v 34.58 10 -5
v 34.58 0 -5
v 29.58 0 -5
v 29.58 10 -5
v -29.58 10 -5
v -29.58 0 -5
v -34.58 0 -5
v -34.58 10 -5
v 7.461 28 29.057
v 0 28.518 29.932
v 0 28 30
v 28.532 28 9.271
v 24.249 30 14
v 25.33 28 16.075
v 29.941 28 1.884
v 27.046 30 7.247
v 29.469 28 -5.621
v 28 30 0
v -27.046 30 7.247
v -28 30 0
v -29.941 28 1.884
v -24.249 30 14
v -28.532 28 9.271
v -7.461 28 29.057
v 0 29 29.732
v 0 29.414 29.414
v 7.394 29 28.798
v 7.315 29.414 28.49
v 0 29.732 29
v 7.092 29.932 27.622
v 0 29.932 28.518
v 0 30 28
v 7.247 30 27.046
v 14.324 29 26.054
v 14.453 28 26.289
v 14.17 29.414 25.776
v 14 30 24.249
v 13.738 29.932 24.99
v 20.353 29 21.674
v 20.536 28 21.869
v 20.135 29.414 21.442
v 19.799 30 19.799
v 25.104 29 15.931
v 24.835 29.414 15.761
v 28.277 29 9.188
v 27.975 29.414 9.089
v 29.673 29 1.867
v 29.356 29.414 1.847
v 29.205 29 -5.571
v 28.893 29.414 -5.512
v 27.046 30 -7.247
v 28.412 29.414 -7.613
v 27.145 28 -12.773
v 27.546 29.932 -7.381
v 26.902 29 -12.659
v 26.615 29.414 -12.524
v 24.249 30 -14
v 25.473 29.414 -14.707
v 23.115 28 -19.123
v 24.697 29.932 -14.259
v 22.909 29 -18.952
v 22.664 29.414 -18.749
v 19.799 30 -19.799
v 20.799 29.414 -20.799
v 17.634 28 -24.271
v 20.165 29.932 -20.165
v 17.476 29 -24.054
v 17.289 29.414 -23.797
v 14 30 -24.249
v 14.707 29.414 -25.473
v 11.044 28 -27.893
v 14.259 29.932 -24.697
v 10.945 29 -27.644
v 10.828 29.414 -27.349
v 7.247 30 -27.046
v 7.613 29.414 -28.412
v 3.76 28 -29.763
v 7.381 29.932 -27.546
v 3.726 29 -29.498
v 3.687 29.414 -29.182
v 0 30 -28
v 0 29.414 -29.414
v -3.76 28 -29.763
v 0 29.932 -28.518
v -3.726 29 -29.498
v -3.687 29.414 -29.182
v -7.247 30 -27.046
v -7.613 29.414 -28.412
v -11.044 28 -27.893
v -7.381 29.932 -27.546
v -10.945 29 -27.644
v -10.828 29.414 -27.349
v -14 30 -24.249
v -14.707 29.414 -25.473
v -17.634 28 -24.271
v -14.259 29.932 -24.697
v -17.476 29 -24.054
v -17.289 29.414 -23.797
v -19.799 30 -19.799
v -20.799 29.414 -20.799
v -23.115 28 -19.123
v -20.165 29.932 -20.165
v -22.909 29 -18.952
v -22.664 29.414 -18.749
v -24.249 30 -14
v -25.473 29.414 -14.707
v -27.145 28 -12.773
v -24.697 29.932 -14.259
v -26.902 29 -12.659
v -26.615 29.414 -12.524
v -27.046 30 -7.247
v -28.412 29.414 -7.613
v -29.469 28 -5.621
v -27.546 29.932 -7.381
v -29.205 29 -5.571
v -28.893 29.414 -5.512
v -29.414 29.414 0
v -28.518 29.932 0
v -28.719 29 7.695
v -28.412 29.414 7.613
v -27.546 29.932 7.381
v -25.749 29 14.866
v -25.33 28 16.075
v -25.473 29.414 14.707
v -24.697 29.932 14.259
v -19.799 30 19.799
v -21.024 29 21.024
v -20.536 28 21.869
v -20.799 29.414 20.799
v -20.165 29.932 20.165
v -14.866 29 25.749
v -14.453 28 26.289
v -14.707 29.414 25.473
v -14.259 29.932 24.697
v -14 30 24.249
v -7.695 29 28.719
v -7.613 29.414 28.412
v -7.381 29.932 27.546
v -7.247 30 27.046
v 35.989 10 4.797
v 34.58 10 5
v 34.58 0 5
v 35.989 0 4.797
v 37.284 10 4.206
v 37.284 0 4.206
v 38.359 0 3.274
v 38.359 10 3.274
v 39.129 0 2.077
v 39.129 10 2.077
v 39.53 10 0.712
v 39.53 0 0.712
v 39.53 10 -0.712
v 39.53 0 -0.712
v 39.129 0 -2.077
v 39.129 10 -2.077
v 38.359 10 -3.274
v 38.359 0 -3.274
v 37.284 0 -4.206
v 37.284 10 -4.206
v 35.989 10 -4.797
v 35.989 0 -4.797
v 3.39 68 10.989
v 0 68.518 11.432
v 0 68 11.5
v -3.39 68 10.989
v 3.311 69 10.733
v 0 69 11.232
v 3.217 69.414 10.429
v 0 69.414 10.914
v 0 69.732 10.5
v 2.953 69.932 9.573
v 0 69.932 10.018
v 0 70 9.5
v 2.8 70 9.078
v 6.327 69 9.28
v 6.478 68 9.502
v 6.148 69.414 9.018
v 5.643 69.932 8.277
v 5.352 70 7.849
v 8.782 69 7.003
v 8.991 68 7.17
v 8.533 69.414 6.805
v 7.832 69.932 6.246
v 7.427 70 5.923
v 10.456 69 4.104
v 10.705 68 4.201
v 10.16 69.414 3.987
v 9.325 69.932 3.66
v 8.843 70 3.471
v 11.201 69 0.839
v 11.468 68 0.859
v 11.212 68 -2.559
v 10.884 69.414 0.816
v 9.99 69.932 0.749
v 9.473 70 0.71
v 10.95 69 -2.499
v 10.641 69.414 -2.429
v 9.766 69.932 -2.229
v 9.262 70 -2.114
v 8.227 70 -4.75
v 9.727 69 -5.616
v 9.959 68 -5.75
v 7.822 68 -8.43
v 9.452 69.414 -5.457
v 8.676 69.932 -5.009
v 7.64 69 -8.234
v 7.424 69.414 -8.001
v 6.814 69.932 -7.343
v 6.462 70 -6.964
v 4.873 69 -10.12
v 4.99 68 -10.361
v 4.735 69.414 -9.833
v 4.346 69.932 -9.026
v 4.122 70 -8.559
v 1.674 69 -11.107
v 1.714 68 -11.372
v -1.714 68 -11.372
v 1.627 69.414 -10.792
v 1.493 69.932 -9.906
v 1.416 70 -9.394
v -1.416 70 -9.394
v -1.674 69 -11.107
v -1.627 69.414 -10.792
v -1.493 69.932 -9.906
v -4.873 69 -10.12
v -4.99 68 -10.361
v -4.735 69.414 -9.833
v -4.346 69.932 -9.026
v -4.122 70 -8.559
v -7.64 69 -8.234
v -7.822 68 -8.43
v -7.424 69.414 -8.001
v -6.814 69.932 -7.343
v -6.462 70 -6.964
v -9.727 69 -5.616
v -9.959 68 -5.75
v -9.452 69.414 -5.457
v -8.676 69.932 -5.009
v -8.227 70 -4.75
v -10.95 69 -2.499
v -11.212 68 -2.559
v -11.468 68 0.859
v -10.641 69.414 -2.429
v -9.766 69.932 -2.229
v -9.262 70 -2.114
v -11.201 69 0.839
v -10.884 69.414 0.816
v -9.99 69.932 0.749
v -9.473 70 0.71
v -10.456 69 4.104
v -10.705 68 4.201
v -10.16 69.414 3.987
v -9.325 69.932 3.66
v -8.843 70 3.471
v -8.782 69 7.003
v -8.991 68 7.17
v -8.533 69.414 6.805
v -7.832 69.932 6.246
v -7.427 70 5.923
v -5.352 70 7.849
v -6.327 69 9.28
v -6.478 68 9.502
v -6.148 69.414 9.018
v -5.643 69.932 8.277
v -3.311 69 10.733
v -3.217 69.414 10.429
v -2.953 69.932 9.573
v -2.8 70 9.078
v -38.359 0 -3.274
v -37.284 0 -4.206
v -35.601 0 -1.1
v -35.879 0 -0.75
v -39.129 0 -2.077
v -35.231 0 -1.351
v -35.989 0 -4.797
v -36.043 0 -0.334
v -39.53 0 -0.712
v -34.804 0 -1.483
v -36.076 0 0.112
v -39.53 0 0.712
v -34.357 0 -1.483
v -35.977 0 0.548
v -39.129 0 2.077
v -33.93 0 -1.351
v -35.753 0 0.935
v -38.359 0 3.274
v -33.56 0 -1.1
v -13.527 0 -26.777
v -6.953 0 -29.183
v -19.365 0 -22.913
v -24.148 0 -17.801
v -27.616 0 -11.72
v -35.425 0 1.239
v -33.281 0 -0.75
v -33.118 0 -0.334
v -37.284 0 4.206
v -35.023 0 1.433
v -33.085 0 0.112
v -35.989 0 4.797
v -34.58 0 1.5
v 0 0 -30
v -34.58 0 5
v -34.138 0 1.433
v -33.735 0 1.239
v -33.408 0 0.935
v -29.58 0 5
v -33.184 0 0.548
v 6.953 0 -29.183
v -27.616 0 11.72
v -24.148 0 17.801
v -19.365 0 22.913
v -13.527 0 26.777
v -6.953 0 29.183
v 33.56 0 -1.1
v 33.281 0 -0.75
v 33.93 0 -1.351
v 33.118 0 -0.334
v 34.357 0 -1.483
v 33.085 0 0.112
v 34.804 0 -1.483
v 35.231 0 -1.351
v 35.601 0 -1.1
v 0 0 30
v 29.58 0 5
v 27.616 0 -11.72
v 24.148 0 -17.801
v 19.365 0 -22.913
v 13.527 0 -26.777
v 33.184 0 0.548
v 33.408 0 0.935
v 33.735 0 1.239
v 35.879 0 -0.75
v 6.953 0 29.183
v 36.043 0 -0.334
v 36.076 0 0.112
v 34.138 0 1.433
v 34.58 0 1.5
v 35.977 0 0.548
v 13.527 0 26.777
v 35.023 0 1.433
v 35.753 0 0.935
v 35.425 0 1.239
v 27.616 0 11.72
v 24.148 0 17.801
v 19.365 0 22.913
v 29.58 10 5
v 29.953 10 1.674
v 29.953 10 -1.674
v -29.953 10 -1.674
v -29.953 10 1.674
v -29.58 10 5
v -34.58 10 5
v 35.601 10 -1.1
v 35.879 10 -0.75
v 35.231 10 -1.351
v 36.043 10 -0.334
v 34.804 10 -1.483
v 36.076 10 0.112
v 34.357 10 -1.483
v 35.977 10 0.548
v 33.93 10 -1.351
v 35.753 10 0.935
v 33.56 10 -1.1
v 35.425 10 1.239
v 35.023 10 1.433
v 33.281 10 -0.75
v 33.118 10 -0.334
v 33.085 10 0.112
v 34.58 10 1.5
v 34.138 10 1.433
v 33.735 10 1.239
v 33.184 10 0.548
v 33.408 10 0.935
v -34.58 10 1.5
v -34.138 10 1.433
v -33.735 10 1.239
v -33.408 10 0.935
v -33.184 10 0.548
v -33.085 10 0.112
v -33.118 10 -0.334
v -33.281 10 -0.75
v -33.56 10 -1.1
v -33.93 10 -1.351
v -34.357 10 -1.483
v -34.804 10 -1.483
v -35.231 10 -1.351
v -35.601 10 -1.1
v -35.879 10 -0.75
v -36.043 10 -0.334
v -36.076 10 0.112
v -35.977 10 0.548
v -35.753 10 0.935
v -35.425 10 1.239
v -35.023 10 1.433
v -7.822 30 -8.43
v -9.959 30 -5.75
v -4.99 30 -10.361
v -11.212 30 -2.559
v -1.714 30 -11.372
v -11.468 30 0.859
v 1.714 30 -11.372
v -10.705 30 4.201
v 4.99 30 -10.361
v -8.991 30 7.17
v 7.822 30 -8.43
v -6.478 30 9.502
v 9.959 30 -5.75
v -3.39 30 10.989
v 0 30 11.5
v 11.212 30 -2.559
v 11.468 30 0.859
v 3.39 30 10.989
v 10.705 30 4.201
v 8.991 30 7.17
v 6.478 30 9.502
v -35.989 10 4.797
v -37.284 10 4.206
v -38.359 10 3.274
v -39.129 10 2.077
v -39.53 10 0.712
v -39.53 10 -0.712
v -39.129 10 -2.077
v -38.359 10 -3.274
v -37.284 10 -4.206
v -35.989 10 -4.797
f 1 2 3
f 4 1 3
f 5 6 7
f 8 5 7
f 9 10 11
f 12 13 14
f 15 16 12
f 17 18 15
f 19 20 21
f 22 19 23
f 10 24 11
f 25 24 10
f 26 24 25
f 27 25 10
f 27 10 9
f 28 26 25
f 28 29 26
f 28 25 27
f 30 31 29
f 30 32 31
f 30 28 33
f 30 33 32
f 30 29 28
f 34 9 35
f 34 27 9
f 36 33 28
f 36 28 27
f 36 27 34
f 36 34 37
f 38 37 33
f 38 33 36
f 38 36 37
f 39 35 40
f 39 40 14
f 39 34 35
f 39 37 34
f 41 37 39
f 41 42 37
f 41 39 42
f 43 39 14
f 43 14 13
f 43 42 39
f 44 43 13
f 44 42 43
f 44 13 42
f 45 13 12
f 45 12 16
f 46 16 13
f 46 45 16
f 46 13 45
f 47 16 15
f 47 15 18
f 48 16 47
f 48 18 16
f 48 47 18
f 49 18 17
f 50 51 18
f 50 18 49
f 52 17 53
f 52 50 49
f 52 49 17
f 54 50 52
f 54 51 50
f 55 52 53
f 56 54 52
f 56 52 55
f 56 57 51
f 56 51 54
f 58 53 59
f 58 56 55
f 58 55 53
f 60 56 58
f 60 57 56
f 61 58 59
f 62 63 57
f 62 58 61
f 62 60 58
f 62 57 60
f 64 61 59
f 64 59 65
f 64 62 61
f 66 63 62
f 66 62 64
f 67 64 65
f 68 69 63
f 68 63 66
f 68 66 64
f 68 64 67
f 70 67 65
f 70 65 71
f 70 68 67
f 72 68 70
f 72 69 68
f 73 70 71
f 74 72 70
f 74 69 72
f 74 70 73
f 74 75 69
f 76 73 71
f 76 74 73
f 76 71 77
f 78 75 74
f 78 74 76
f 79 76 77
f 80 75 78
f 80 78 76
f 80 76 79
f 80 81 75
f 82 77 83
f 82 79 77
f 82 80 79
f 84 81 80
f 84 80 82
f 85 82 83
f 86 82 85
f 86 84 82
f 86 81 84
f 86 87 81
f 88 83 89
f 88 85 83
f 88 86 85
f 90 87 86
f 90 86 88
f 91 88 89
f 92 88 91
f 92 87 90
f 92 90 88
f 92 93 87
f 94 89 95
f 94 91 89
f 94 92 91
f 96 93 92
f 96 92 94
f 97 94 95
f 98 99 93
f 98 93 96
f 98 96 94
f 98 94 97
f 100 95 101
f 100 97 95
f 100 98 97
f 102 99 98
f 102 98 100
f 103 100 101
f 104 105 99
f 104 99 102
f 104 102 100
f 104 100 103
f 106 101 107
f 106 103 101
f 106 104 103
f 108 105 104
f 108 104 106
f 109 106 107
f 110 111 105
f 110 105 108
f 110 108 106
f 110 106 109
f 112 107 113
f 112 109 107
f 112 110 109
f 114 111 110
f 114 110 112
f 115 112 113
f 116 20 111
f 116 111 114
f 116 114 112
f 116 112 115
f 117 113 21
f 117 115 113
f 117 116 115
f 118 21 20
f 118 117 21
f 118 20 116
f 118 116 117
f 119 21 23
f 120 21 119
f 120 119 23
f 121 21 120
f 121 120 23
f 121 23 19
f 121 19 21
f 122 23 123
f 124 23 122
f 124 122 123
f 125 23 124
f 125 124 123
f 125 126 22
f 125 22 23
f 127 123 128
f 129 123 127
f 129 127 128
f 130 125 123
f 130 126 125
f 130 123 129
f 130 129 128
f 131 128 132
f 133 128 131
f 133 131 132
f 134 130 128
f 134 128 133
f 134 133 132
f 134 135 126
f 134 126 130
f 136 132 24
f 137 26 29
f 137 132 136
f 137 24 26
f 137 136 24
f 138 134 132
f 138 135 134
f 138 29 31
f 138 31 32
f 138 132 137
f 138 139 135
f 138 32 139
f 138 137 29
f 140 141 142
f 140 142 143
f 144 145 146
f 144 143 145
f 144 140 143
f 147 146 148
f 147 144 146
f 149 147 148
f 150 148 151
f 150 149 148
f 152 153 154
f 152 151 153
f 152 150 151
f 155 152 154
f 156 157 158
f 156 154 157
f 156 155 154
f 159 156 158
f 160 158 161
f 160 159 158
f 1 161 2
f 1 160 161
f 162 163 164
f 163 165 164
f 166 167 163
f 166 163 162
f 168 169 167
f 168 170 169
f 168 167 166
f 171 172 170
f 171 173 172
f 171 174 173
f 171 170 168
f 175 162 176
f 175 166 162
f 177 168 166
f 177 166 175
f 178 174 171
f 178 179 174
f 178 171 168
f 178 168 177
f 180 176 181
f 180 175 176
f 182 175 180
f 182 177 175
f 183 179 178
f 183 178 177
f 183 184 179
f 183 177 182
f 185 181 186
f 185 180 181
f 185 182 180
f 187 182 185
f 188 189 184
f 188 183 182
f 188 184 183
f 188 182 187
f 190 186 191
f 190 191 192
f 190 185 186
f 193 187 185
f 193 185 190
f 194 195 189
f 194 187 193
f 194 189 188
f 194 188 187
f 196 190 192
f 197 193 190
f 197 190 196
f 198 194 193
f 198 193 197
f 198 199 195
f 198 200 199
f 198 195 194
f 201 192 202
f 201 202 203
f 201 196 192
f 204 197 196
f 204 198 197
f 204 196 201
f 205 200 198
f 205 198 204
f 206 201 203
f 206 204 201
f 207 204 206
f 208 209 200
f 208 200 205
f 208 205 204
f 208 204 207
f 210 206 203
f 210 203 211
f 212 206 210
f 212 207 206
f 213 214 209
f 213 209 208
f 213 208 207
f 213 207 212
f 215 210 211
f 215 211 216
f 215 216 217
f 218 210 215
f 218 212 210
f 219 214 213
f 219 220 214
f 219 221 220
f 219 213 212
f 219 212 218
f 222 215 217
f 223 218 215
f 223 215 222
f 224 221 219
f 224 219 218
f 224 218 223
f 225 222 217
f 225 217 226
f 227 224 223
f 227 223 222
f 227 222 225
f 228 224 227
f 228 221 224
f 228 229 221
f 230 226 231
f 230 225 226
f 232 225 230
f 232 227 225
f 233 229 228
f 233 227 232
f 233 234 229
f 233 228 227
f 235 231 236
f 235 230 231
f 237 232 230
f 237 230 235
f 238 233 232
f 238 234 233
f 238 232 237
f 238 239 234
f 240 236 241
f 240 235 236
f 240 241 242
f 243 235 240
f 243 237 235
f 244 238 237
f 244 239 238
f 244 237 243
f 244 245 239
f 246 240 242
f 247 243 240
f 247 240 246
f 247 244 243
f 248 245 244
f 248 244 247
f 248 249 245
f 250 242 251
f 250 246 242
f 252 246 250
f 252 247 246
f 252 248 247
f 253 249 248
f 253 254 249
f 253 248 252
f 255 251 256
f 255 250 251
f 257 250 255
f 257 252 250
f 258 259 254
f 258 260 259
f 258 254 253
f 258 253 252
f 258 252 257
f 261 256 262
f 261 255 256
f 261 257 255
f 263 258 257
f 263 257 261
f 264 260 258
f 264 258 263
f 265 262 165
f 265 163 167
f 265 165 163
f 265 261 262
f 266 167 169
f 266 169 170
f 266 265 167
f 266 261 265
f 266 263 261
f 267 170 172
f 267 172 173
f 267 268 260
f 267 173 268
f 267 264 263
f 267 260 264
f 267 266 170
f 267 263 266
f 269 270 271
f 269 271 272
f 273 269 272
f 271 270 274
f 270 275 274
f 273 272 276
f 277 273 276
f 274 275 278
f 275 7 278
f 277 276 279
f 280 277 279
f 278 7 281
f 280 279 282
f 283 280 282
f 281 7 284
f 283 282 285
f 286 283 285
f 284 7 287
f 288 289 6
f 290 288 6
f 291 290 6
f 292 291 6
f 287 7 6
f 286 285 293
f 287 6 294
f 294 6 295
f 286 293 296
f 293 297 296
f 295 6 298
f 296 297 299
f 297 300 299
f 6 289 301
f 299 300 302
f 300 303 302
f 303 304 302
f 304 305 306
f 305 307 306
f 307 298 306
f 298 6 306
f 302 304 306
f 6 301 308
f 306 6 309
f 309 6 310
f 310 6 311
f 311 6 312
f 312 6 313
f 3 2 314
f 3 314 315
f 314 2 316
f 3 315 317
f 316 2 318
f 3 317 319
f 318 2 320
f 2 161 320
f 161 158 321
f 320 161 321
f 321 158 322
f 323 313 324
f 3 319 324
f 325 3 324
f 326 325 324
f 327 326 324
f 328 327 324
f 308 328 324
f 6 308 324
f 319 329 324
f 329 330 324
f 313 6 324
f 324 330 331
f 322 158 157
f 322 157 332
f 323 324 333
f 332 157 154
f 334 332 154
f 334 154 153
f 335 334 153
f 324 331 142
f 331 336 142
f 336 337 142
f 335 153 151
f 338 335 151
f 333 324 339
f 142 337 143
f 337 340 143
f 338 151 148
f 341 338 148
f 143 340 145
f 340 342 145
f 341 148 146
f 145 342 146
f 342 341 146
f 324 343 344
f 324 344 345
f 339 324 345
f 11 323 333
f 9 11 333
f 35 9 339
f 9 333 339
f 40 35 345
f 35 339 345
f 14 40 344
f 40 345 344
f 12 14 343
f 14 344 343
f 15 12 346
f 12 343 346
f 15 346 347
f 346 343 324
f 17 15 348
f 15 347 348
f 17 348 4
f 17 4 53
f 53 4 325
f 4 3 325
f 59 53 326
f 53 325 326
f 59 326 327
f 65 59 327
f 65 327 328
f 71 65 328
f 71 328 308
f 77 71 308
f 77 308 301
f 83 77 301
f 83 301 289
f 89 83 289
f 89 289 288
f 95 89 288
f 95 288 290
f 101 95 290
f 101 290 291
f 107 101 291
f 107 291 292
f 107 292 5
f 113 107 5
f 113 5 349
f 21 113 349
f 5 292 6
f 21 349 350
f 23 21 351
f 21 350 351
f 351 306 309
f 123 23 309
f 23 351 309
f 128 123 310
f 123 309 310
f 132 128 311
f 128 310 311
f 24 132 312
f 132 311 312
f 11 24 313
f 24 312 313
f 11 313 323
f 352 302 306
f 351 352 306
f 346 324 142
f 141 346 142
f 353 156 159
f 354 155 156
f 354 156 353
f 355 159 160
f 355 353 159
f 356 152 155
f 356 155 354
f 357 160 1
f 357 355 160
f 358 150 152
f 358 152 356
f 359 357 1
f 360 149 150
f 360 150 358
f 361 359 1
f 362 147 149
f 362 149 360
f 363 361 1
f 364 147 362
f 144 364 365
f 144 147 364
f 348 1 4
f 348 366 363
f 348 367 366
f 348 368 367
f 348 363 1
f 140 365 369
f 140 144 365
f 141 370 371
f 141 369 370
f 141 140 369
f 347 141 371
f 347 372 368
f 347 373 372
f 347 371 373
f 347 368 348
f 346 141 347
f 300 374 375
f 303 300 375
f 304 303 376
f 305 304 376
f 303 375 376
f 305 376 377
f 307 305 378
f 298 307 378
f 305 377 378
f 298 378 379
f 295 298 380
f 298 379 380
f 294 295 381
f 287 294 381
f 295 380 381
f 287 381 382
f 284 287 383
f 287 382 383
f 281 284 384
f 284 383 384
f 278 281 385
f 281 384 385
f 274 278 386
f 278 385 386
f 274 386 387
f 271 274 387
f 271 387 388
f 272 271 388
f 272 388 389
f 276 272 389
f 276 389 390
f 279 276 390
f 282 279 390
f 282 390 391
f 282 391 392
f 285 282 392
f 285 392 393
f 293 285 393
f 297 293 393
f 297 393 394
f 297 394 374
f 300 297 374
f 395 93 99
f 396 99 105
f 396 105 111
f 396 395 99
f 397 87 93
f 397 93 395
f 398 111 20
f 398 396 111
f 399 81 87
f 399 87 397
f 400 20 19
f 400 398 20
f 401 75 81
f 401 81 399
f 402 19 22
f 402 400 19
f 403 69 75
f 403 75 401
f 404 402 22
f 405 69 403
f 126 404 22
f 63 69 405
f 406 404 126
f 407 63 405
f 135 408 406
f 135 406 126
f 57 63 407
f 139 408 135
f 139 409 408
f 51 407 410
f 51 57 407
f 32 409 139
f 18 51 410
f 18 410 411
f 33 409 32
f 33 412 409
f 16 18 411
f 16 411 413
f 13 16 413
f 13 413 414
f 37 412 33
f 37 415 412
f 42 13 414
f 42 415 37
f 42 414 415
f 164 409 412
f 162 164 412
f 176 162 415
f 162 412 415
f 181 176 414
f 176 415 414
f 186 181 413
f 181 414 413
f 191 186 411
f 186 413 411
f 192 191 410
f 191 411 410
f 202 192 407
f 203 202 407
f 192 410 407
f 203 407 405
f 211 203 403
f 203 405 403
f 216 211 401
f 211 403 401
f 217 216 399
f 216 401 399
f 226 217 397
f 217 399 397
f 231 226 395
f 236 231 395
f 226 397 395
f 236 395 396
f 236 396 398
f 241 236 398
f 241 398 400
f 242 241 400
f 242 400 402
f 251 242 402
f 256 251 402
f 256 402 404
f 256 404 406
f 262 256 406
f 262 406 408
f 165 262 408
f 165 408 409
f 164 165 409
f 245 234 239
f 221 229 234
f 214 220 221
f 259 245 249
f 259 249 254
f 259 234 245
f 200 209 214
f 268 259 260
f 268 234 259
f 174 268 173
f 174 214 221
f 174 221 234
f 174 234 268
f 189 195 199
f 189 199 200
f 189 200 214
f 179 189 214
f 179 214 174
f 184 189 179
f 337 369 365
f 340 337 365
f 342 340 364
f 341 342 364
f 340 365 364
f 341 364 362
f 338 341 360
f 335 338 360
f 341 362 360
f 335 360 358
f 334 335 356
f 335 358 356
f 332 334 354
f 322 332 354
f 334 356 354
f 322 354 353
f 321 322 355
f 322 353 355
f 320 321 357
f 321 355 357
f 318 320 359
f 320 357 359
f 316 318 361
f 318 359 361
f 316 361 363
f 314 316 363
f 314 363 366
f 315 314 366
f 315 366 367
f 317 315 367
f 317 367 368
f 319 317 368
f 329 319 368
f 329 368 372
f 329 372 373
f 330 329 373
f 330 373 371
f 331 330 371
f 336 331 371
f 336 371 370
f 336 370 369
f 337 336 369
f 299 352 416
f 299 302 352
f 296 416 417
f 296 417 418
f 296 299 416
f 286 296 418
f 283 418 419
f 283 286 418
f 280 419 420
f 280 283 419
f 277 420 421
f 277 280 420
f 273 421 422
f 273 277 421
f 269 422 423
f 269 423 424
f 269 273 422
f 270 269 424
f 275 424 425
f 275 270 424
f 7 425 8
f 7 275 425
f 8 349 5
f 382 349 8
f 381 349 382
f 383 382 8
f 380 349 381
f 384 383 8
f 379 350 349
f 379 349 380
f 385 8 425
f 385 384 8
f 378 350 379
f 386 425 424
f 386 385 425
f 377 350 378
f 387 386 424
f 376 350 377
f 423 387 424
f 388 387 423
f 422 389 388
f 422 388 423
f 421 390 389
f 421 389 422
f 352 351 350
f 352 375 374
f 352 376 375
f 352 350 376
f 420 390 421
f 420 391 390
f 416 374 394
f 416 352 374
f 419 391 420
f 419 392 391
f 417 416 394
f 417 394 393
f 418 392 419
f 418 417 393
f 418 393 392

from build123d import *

# Parameters (mm, degrees)
SKETCH_1_R          = 30
SKETCH_1_R_2        = 11.5
EXTRUDE_1_DEPTH     = 30
SKETCH_1_3_R        = 11.5
EXTRUDE_2_DEPTH     = 70
EXTRUDE_3_DEPTH     = 10
FILLET_1_RADIUS     = 5
FILLET_1_LENGTH     = 10
FILLET_2_RADIUS     = 5
FILLET_2_LENGTH     = 10
SKETCH_4_R          = 1.5
CUT_EXTRUDE_1_DEPTH = 78.888432891
FILLET_3_R          = 2


with BuildPart() as part:
    # 草圖1 → 填料-伸長1 (new body)
    # profile 1 of 2: a face of its own
    with BuildSketch(Plane(origin=(0, 0, 0), x_dir=(1, 0, 0), z_dir=(0, 1, 0))):
        with Locations(Location((0, 0, 0), (0, 0, 270))):
            Circle(SKETCH_1_R)
        Circle(SKETCH_1_R_2, mode=Mode.SUBTRACT)
    # profile 2 of 2: a face of its own
    with BuildSketch(Plane(origin=(0, 0, 0), x_dir=(1, 0, 0), z_dir=(0, 1, 0))):
        Circle(SKETCH_1_R_2)
    extrude(amount=EXTRUDE_1_DEPTH)

    # 草圖1<3> → 填料-伸長2 (add)
    with BuildSketch(Plane(origin=(0, 0, 0), x_dir=(1, 0, 0), z_dir=(0, 1, 0))):
        with Locations(Location((0, 0, 0), (0, 0, 270))):
            Circle(SKETCH_1_3_R)
    extrude(amount=EXTRUDE_2_DEPTH)

    # 草圖3 → 填料-伸長3 (add)
    with BuildSketch(Plane.XZ):
        with BuildLine():
            Line((29.580398915, 5), (39.580398915, 5))
            Line((39.580398915, 5), (39.580398915, -5))
            Line((39.580398915, -5), (29.580398915, -5))
            ThreePointArc((29.580398915, -5), (30, 0), (29.580398915, 5))
        make_face()
        with BuildLine():
            Line((-29.580398915, -5), (-39.580398915, -5))
            Line((-39.580398915, -5), (-39.580398915, 5))
            Line((-39.580398915, 5), (-29.580398915, 5))
            ThreePointArc((-29.580398915, 5), (-30, 0), (-29.580398915, -5))
        make_face()
    extrude(amount=-EXTRUDE_3_DEPTH)

    # 圓角1: full round fillet: the end face becomes a half cylinder, R = half its width
    fillet_1_face = Plane((-39.580398915, 5, 0), x_dir=(0, -1, 0), z_dir=(-1, 0, 0))  # on the end face: x along it, z out of the body
    fillet_1_slab = fillet_1_face.offset(-FILLET_1_RADIUS / 2) * Box(FILLET_1_LENGTH, 2 * FILLET_1_RADIUS, FILLET_1_RADIUS, mode=Mode.PRIVATE)  # the body's end, R deep
    fillet_1_round = Plane((-34.580398915, 5, 0), x_dir=(-1, 0, 0), z_dir=(0, -1, 0)) * Cylinder(FILLET_1_RADIUS, FILLET_1_LENGTH, mode=Mode.PRIVATE)  # its axis R under the face
    add(fillet_1_slab - fillet_1_round, mode=Mode.SUBTRACT)

    # 圓角2: full round fillet: the end face becomes a half cylinder, R = half its width
    fillet_2_face = Plane((39.580398915, 5, 0), x_dir=(0, 1, 0), z_dir=(1, 0, 0))  # on the end face: x along it, z out of the body
    fillet_2_slab = fillet_2_face.offset(-FILLET_2_RADIUS / 2) * Box(FILLET_2_LENGTH, 2 * FILLET_2_RADIUS, FILLET_2_RADIUS, mode=Mode.PRIVATE)  # the body's end, R deep
    fillet_2_round = Plane((34.580398915, 5, 0), x_dir=(1, 0, 0), z_dir=(0, 1, 0)) * Cylinder(FILLET_2_RADIUS, FILLET_2_LENGTH, mode=Mode.PRIVATE)  # its axis R under the face
    add(fillet_2_slab - fillet_2_round, mode=Mode.SUBTRACT)

    # 草圖4 → 除料-伸長1 (cut, through all)
    with BuildSketch(Plane(origin=(0, 10, 0), x_dir=(1, 0, 0), z_dir=(0, 1, 0))):
        with Locations(Location((34.580398915, 0, 0), (0, 0, 270))):
            Circle(SKETCH_4_R)
        with Locations(Location((-34.580398915, 0, 0), (0, 0, 270))):
            Circle(SKETCH_4_R)
    extrude(amount=-CUT_EXTRUDE_1_DEPTH, mode=Mode.SUBTRACT)

    # 圓角3
    fillet_3_edges = [part.edges().sort_by_distance(p)[0] for p in [
        (0, 30, -30),
        (0, 70, -11.5),
    ]]
    fillet(fillet_3_edges, radius=FILLET_3_R)


solid = part.part
